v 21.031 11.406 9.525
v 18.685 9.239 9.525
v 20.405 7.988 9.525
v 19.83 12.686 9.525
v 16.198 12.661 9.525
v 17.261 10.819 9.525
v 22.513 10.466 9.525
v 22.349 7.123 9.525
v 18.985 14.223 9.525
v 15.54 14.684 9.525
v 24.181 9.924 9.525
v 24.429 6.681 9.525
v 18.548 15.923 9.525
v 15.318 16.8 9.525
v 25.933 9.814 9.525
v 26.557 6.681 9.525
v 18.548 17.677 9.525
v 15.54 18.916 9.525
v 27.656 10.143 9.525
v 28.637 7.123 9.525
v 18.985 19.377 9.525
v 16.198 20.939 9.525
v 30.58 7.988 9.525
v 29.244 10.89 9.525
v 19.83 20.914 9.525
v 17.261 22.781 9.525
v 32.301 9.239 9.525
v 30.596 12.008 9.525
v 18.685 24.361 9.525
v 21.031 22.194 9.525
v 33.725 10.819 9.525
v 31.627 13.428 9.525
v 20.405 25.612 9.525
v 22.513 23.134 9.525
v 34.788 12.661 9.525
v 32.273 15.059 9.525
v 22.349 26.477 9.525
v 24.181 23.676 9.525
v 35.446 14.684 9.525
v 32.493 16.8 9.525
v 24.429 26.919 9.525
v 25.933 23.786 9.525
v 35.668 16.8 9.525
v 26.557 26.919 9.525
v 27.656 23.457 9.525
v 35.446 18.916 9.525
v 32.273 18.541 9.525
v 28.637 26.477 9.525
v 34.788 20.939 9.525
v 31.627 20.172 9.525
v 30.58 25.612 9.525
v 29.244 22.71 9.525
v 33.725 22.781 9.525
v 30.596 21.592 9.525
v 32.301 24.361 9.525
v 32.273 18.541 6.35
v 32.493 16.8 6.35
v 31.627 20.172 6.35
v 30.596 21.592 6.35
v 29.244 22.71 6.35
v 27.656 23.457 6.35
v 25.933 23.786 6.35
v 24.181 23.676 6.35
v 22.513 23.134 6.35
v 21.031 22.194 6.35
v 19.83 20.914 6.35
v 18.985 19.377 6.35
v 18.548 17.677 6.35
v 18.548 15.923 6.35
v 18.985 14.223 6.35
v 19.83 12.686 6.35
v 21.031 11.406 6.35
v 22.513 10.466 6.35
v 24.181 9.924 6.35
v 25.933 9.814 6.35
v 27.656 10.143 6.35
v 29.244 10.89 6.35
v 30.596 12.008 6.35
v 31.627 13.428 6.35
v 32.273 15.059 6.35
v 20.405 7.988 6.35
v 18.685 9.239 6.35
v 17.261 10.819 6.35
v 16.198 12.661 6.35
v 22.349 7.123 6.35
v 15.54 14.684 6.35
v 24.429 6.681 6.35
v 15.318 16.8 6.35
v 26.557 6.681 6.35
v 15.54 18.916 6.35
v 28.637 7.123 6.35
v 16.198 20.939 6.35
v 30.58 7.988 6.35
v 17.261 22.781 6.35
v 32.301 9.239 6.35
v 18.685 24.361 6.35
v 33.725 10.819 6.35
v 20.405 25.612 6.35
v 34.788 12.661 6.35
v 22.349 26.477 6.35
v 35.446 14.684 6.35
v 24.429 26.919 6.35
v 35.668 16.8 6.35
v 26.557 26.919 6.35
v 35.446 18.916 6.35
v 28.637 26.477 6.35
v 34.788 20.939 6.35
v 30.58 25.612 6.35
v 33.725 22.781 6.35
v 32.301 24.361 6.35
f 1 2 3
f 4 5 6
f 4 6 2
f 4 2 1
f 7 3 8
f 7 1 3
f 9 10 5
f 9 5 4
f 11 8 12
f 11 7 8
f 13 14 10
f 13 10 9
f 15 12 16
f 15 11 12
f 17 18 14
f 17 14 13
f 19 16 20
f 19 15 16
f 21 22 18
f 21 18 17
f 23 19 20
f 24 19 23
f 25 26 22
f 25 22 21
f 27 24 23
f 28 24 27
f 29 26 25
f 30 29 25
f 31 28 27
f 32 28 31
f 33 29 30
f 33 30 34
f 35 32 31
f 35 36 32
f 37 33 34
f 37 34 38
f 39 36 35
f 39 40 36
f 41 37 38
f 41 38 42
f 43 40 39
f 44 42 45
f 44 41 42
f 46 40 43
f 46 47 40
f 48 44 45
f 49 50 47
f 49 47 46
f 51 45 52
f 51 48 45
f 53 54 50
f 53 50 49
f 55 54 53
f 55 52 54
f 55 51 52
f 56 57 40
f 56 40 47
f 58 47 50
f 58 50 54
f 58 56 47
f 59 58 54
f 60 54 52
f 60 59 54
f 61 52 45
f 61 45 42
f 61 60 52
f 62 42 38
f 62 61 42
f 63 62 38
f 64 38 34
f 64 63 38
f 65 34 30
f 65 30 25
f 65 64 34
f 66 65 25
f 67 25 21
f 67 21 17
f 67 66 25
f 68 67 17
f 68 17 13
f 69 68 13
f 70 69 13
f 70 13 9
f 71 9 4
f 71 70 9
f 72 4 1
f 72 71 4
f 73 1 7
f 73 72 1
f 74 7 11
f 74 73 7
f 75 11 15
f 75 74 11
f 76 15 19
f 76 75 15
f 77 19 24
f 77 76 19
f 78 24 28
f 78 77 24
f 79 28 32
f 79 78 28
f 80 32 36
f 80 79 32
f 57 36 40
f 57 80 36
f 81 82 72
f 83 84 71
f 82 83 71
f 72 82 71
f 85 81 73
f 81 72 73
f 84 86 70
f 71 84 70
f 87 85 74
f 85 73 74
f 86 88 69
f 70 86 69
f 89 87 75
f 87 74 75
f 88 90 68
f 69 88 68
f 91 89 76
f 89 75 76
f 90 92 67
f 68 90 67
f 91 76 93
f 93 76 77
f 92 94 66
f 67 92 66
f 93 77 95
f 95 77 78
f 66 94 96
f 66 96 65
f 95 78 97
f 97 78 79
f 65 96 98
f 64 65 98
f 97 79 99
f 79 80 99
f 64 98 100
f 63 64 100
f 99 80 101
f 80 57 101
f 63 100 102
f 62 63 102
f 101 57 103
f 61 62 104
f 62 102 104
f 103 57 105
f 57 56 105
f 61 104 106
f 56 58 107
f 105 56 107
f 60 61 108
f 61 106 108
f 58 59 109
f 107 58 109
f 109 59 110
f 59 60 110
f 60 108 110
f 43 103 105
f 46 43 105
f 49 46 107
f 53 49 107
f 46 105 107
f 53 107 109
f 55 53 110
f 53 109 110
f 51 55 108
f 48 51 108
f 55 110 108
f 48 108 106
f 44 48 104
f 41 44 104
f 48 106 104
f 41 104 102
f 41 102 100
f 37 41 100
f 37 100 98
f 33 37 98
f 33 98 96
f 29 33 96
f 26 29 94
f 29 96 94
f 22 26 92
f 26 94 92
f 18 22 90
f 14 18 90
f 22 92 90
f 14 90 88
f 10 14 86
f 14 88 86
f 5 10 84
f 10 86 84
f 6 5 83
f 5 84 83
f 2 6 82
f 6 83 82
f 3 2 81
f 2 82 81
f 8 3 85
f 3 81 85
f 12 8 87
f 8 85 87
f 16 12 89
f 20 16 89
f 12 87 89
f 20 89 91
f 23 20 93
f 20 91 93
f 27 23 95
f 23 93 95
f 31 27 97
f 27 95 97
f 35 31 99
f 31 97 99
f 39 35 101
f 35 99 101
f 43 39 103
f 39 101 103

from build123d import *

# Parameters (mm, degrees)
SKETCH1_R                = 2
BOSS_EXTRUDE1_DEPTH      = 6.35
CUT_EXTRUDE1_DEPTH       = 93.473426076
CUT_EXTRUDE1_DEPTH_BACK  = 93.473426076
SKETCH2_R                = 7
BOSS_EXTRUDE2_DEPTH      = 31.75
BOSS_EXTRUDE2_DEPTH_BACK = 12.7
SKETCH5_R                = 7
SKETCH6_R                = 7
BOSS_EXTRUDE3_DEPTH      = 6.35
FILLET1_R                = 6.35
FILLET2_R                = 3.175
SKETCH7_R                = 10.175
SKETCH7_R_2              = 7
BOSS_EXTRUDE4_DEPTH      = 3.175


with BuildPart() as part:
    # Sketch1 → Boss-Extrude1 (new, symmetric)
    # profile 1 of 3: a face of its own
    with BuildSketch(Plane.XY):
        Polygon((22.188571811, 51.670547503), (22.188571811, 37.229452497), (13.9055, 25.4), (13.9055, 0), (52.0055, 0), (52.0055, 25.4), (26.6055, 76.2), (13.9055, 76.2), (13.9055, 63.5), align=None)
        with Locations((33.493, 8.8)):
            Circle(SKETCH1_R, mode=Mode.SUBTRACT)
        with Locations((17.493, 8.8)):
            Circle(SKETCH1_R, mode=Mode.SUBTRACT)
    # profile 2 of 3: a face of its own
    with BuildSketch(Plane.XY):
        with Locations((17.493, 8.8)):
            Circle(SKETCH1_R)
    # profile 3 of 3: a face of its own
    with BuildSketch(Plane.XY):
        with Locations((33.493, 8.8)):
            Circle(SKETCH1_R)
    extrude(amount=BOSS_EXTRUDE1_DEPTH, both=True)

    # Sketch2 → Cut-Extrude1 (cut, two sides: drawn at the far end of the back side and taken through both)
    with BuildSketch(Plane.XY.offset(-CUT_EXTRUDE1_DEPTH_BACK)):
        with Locations((25.493, 16.8)):
            Circle(SKETCH2_R)
    extrude(amount=CUT_EXTRUDE1_DEPTH + CUT_EXTRUDE1_DEPTH_BACK, mode=Mode.SUBTRACT)

    # Fillet2
    fillet2_edges = [part.edges().sort_by_distance(p)[0] for p in [
        (22.188571811, 51.670547503, 0),
        (13.9055, 63.5, 0),
        (13.9055, 76.2, 0),
        (26.6055, 76.2, 0),
        (52.0055, 25.4, 0),
        (52.0055, 0, 0),
        (13.9055, 0, 0),
        (13.9055, 25.4, 0),
        (22.188571811, 37.229452497, 0),
    ]]
    fillet(fillet2_edges, radius=FILLET2_R)


with BuildPart() as body_2:
    # Sketch5 → Boss-Extrude2 (new, two sides: drawn at the far end of the back side and taken through both)
    with BuildSketch(Plane.XY.offset(6.35).offset(-BOSS_EXTRUDE2_DEPTH_BACK)):
        with Locations((25.493, 16.8)):
            Circle(SKETCH5_R)
    extrude(amount=BOSS_EXTRUDE2_DEPTH + BOSS_EXTRUDE2_DEPTH_BACK)


with BuildPart() as body_3:
    # Sketch6 → Boss-Extrude3 (new, symmetric)
    # profile 1 of 2: a face of its own
    with BuildSketch(Plane.XY.offset(15.875)):
        Polygon((0, -22.225), (0, 0), (-14.3805, 0), (-14.3805, 30.15), (-36.6055, 30.15), (-36.6055, -22.225), (-14.3805, -22.225), align=None)
        with Locations((-25.493, 16.8)):
            Circle(SKETCH6_R, mode=Mode.SUBTRACT)
    # profile 2 of 2: a face of its own
    with BuildSketch(Plane.XY.offset(15.875)):
        Polygon((14.3805, 30.15), (14.3805, 0), (0, 0), (0, -22.225), (14.3805, -22.225), (36.6055, -22.225), (36.6055, 30.15), align=None)
        with Locations((25.493, 16.8)):
            Circle(SKETCH6_R, mode=Mode.SUBTRACT)
    extrude(amount=BOSS_EXTRUDE3_DEPTH, both=True)

    # Fillet1
    fillet1_edges = [body_3.edges().sort_by_distance(p)[0] for p in [
        (-14.3805, 0, 15.875),
        (14.3805, 0, 15.875),
        (14.3805, 30.15, 15.875),
        (36.6055, 30.15, 15.875),
        (36.6055, -22.225, 15.875),
        (-36.6055, -22.225, 15.875),
        (-36.6055, 30.15, 15.875),
        (-14.3805, 30.15, 15.875),
    ]]
    fillet(fillet1_edges, radius=FILLET1_R)


with BuildPart() as body_4:
    # Sketch7 → Boss-Extrude4 (new body)
    with BuildSketch(Plane.XY.offset(6.35)):
        with Locations((25.493, 16.8)):
            Circle(SKETCH7_R)
        with Locations((25.493, 16.8)):
            Circle(SKETCH7_R_2, mode=Mode.SUBTRACT)
    extrude(amount=BOSS_EXTRUDE4_DEPTH)


solid = body_4.part
